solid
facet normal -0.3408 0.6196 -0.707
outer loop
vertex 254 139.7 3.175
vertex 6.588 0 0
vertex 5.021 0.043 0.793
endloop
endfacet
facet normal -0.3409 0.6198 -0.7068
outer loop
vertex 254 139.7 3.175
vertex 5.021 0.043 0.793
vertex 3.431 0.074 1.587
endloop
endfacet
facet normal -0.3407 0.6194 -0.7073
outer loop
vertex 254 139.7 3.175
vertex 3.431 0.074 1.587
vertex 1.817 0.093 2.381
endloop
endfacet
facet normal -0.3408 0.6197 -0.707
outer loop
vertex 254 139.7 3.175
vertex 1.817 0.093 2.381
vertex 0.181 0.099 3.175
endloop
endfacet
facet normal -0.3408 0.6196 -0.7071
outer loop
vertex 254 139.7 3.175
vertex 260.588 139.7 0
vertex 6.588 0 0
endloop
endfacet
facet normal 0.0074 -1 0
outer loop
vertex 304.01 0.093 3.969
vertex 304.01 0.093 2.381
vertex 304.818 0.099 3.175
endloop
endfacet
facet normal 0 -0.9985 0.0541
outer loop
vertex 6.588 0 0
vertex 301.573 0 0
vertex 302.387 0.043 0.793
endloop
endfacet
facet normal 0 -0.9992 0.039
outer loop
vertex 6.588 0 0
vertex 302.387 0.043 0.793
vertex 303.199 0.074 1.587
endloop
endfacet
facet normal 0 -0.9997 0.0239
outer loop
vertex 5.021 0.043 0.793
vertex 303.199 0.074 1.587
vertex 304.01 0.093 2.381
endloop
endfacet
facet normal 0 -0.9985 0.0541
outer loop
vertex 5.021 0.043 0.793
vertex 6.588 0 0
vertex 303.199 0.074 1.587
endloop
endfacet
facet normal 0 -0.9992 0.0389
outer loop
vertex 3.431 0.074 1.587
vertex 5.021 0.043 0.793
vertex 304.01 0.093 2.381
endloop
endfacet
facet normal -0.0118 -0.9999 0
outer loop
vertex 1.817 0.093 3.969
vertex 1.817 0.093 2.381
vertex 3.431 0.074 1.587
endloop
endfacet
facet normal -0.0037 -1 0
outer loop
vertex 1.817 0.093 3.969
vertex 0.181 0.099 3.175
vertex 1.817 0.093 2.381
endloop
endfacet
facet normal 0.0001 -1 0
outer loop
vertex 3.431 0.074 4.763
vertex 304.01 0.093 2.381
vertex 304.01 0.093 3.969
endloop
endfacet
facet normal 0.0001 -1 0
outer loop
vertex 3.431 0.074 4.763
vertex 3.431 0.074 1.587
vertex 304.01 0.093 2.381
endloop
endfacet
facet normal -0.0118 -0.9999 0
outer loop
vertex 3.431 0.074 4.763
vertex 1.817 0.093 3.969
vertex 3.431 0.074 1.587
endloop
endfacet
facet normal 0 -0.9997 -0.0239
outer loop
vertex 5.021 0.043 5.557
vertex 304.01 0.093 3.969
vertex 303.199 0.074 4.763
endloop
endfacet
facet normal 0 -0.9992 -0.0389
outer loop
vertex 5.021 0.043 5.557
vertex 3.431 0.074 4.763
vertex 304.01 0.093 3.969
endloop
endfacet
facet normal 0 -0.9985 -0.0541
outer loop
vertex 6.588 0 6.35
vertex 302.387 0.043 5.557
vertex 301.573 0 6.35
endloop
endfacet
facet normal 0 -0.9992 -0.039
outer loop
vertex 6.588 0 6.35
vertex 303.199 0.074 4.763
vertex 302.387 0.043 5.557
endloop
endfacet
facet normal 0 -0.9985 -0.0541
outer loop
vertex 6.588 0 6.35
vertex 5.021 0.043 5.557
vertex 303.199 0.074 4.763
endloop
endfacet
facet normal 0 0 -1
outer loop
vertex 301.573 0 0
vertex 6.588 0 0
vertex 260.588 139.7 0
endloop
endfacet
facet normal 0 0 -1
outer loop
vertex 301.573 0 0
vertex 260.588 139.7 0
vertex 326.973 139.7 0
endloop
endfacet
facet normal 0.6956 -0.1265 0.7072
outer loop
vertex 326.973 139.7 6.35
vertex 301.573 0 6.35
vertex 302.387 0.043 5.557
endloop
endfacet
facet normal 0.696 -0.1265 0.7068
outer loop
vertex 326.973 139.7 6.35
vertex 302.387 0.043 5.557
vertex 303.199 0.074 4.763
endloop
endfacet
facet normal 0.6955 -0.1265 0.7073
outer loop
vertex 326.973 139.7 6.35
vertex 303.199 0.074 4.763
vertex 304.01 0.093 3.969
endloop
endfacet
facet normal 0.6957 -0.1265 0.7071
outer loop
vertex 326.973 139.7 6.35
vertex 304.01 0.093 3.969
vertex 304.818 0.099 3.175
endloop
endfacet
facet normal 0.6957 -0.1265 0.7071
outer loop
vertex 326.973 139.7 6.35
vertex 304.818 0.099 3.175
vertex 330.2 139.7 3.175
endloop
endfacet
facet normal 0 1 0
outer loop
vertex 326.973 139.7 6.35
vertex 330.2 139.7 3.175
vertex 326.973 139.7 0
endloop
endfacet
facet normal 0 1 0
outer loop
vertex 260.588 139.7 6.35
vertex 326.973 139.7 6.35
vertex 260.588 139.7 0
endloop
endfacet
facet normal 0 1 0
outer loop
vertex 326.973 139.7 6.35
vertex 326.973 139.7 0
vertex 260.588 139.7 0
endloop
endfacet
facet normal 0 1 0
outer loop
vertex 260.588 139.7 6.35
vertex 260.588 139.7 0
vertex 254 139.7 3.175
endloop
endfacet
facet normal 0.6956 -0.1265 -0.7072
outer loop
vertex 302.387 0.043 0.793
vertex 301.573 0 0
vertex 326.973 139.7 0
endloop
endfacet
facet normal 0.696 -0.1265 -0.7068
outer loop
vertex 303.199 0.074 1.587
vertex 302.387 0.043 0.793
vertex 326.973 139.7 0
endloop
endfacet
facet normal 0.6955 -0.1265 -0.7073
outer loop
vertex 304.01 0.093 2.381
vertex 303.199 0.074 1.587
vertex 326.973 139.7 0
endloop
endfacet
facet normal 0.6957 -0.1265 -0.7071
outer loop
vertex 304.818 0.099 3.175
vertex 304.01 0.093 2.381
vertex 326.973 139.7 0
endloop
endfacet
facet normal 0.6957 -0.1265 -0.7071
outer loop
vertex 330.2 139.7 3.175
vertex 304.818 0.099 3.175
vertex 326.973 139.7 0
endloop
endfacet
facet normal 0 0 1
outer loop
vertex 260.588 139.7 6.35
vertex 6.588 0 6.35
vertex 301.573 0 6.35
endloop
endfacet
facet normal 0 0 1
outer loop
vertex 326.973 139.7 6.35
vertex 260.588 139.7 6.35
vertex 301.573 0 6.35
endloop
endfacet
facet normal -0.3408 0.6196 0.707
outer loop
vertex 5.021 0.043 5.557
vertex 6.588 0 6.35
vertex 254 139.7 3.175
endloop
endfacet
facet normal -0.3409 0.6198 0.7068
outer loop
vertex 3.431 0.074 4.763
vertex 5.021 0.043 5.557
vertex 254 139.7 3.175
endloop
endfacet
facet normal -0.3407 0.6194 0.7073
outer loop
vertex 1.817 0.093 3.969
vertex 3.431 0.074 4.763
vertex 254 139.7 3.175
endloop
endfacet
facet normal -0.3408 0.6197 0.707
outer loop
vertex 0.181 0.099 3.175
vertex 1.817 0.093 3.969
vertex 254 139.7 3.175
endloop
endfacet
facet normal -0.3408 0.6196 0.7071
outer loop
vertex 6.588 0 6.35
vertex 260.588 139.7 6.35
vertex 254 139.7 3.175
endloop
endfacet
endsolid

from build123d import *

# Parameters (mm, degrees)
BOSS_EXTRUDE1_DEPTH     = 6.35
CHAMFER1_SIZE           = 3.175
CUT_EXTRUDE1_DEPTH      = 316.484
CUT_EXTRUDE1_DEPTH_BACK = 13.716
SKETCH2_R               = 50.8


with BuildPart() as part:
    # Sketch1 → Boss-Extrude1 (new body)
    with BuildSketch(Plane.XY):
        Polygon((254, 139.7), (0, 0), (254, 0), align=None)
        Polygon((254, 139.7), (254, 0), (304.8, 0), (330.2, 139.7), align=None)
    extrude(amount=BOSS_EXTRUDE1_DEPTH)

    # Chamfer1
    chamfer1_edges = [part.edges().sort_by_distance(p)[0] for p in [
        (317.5, 69.85, 0),
        (317.5, 69.85, 6.35),
        (127, 69.85, 6.35),
        (127, 69.85, 0),
    ]]
    chamfer(chamfer1_edges, length=CHAMFER1_SIZE - 0.0001)  # a hair under: the kernel refuses the full size

    # Sketch2 → Cut-Extrude1 (cut, two sides: drawn at the far end of the back side and taken through both)
    with BuildSketch(Plane(origin=(0, 0, 0), x_dir=(0, 0, -1), z_dir=(1, 0, 0)).offset(-CUT_EXTRUDE1_DEPTH_BACK)):
        with Locations((-3.175, -50.700684167)):
            Circle(SKETCH2_R)
    extrude(amount=CUT_EXTRUDE1_DEPTH + CUT_EXTRUDE1_DEPTH_BACK, mode=Mode.SUBTRACT)


solid = part.part
